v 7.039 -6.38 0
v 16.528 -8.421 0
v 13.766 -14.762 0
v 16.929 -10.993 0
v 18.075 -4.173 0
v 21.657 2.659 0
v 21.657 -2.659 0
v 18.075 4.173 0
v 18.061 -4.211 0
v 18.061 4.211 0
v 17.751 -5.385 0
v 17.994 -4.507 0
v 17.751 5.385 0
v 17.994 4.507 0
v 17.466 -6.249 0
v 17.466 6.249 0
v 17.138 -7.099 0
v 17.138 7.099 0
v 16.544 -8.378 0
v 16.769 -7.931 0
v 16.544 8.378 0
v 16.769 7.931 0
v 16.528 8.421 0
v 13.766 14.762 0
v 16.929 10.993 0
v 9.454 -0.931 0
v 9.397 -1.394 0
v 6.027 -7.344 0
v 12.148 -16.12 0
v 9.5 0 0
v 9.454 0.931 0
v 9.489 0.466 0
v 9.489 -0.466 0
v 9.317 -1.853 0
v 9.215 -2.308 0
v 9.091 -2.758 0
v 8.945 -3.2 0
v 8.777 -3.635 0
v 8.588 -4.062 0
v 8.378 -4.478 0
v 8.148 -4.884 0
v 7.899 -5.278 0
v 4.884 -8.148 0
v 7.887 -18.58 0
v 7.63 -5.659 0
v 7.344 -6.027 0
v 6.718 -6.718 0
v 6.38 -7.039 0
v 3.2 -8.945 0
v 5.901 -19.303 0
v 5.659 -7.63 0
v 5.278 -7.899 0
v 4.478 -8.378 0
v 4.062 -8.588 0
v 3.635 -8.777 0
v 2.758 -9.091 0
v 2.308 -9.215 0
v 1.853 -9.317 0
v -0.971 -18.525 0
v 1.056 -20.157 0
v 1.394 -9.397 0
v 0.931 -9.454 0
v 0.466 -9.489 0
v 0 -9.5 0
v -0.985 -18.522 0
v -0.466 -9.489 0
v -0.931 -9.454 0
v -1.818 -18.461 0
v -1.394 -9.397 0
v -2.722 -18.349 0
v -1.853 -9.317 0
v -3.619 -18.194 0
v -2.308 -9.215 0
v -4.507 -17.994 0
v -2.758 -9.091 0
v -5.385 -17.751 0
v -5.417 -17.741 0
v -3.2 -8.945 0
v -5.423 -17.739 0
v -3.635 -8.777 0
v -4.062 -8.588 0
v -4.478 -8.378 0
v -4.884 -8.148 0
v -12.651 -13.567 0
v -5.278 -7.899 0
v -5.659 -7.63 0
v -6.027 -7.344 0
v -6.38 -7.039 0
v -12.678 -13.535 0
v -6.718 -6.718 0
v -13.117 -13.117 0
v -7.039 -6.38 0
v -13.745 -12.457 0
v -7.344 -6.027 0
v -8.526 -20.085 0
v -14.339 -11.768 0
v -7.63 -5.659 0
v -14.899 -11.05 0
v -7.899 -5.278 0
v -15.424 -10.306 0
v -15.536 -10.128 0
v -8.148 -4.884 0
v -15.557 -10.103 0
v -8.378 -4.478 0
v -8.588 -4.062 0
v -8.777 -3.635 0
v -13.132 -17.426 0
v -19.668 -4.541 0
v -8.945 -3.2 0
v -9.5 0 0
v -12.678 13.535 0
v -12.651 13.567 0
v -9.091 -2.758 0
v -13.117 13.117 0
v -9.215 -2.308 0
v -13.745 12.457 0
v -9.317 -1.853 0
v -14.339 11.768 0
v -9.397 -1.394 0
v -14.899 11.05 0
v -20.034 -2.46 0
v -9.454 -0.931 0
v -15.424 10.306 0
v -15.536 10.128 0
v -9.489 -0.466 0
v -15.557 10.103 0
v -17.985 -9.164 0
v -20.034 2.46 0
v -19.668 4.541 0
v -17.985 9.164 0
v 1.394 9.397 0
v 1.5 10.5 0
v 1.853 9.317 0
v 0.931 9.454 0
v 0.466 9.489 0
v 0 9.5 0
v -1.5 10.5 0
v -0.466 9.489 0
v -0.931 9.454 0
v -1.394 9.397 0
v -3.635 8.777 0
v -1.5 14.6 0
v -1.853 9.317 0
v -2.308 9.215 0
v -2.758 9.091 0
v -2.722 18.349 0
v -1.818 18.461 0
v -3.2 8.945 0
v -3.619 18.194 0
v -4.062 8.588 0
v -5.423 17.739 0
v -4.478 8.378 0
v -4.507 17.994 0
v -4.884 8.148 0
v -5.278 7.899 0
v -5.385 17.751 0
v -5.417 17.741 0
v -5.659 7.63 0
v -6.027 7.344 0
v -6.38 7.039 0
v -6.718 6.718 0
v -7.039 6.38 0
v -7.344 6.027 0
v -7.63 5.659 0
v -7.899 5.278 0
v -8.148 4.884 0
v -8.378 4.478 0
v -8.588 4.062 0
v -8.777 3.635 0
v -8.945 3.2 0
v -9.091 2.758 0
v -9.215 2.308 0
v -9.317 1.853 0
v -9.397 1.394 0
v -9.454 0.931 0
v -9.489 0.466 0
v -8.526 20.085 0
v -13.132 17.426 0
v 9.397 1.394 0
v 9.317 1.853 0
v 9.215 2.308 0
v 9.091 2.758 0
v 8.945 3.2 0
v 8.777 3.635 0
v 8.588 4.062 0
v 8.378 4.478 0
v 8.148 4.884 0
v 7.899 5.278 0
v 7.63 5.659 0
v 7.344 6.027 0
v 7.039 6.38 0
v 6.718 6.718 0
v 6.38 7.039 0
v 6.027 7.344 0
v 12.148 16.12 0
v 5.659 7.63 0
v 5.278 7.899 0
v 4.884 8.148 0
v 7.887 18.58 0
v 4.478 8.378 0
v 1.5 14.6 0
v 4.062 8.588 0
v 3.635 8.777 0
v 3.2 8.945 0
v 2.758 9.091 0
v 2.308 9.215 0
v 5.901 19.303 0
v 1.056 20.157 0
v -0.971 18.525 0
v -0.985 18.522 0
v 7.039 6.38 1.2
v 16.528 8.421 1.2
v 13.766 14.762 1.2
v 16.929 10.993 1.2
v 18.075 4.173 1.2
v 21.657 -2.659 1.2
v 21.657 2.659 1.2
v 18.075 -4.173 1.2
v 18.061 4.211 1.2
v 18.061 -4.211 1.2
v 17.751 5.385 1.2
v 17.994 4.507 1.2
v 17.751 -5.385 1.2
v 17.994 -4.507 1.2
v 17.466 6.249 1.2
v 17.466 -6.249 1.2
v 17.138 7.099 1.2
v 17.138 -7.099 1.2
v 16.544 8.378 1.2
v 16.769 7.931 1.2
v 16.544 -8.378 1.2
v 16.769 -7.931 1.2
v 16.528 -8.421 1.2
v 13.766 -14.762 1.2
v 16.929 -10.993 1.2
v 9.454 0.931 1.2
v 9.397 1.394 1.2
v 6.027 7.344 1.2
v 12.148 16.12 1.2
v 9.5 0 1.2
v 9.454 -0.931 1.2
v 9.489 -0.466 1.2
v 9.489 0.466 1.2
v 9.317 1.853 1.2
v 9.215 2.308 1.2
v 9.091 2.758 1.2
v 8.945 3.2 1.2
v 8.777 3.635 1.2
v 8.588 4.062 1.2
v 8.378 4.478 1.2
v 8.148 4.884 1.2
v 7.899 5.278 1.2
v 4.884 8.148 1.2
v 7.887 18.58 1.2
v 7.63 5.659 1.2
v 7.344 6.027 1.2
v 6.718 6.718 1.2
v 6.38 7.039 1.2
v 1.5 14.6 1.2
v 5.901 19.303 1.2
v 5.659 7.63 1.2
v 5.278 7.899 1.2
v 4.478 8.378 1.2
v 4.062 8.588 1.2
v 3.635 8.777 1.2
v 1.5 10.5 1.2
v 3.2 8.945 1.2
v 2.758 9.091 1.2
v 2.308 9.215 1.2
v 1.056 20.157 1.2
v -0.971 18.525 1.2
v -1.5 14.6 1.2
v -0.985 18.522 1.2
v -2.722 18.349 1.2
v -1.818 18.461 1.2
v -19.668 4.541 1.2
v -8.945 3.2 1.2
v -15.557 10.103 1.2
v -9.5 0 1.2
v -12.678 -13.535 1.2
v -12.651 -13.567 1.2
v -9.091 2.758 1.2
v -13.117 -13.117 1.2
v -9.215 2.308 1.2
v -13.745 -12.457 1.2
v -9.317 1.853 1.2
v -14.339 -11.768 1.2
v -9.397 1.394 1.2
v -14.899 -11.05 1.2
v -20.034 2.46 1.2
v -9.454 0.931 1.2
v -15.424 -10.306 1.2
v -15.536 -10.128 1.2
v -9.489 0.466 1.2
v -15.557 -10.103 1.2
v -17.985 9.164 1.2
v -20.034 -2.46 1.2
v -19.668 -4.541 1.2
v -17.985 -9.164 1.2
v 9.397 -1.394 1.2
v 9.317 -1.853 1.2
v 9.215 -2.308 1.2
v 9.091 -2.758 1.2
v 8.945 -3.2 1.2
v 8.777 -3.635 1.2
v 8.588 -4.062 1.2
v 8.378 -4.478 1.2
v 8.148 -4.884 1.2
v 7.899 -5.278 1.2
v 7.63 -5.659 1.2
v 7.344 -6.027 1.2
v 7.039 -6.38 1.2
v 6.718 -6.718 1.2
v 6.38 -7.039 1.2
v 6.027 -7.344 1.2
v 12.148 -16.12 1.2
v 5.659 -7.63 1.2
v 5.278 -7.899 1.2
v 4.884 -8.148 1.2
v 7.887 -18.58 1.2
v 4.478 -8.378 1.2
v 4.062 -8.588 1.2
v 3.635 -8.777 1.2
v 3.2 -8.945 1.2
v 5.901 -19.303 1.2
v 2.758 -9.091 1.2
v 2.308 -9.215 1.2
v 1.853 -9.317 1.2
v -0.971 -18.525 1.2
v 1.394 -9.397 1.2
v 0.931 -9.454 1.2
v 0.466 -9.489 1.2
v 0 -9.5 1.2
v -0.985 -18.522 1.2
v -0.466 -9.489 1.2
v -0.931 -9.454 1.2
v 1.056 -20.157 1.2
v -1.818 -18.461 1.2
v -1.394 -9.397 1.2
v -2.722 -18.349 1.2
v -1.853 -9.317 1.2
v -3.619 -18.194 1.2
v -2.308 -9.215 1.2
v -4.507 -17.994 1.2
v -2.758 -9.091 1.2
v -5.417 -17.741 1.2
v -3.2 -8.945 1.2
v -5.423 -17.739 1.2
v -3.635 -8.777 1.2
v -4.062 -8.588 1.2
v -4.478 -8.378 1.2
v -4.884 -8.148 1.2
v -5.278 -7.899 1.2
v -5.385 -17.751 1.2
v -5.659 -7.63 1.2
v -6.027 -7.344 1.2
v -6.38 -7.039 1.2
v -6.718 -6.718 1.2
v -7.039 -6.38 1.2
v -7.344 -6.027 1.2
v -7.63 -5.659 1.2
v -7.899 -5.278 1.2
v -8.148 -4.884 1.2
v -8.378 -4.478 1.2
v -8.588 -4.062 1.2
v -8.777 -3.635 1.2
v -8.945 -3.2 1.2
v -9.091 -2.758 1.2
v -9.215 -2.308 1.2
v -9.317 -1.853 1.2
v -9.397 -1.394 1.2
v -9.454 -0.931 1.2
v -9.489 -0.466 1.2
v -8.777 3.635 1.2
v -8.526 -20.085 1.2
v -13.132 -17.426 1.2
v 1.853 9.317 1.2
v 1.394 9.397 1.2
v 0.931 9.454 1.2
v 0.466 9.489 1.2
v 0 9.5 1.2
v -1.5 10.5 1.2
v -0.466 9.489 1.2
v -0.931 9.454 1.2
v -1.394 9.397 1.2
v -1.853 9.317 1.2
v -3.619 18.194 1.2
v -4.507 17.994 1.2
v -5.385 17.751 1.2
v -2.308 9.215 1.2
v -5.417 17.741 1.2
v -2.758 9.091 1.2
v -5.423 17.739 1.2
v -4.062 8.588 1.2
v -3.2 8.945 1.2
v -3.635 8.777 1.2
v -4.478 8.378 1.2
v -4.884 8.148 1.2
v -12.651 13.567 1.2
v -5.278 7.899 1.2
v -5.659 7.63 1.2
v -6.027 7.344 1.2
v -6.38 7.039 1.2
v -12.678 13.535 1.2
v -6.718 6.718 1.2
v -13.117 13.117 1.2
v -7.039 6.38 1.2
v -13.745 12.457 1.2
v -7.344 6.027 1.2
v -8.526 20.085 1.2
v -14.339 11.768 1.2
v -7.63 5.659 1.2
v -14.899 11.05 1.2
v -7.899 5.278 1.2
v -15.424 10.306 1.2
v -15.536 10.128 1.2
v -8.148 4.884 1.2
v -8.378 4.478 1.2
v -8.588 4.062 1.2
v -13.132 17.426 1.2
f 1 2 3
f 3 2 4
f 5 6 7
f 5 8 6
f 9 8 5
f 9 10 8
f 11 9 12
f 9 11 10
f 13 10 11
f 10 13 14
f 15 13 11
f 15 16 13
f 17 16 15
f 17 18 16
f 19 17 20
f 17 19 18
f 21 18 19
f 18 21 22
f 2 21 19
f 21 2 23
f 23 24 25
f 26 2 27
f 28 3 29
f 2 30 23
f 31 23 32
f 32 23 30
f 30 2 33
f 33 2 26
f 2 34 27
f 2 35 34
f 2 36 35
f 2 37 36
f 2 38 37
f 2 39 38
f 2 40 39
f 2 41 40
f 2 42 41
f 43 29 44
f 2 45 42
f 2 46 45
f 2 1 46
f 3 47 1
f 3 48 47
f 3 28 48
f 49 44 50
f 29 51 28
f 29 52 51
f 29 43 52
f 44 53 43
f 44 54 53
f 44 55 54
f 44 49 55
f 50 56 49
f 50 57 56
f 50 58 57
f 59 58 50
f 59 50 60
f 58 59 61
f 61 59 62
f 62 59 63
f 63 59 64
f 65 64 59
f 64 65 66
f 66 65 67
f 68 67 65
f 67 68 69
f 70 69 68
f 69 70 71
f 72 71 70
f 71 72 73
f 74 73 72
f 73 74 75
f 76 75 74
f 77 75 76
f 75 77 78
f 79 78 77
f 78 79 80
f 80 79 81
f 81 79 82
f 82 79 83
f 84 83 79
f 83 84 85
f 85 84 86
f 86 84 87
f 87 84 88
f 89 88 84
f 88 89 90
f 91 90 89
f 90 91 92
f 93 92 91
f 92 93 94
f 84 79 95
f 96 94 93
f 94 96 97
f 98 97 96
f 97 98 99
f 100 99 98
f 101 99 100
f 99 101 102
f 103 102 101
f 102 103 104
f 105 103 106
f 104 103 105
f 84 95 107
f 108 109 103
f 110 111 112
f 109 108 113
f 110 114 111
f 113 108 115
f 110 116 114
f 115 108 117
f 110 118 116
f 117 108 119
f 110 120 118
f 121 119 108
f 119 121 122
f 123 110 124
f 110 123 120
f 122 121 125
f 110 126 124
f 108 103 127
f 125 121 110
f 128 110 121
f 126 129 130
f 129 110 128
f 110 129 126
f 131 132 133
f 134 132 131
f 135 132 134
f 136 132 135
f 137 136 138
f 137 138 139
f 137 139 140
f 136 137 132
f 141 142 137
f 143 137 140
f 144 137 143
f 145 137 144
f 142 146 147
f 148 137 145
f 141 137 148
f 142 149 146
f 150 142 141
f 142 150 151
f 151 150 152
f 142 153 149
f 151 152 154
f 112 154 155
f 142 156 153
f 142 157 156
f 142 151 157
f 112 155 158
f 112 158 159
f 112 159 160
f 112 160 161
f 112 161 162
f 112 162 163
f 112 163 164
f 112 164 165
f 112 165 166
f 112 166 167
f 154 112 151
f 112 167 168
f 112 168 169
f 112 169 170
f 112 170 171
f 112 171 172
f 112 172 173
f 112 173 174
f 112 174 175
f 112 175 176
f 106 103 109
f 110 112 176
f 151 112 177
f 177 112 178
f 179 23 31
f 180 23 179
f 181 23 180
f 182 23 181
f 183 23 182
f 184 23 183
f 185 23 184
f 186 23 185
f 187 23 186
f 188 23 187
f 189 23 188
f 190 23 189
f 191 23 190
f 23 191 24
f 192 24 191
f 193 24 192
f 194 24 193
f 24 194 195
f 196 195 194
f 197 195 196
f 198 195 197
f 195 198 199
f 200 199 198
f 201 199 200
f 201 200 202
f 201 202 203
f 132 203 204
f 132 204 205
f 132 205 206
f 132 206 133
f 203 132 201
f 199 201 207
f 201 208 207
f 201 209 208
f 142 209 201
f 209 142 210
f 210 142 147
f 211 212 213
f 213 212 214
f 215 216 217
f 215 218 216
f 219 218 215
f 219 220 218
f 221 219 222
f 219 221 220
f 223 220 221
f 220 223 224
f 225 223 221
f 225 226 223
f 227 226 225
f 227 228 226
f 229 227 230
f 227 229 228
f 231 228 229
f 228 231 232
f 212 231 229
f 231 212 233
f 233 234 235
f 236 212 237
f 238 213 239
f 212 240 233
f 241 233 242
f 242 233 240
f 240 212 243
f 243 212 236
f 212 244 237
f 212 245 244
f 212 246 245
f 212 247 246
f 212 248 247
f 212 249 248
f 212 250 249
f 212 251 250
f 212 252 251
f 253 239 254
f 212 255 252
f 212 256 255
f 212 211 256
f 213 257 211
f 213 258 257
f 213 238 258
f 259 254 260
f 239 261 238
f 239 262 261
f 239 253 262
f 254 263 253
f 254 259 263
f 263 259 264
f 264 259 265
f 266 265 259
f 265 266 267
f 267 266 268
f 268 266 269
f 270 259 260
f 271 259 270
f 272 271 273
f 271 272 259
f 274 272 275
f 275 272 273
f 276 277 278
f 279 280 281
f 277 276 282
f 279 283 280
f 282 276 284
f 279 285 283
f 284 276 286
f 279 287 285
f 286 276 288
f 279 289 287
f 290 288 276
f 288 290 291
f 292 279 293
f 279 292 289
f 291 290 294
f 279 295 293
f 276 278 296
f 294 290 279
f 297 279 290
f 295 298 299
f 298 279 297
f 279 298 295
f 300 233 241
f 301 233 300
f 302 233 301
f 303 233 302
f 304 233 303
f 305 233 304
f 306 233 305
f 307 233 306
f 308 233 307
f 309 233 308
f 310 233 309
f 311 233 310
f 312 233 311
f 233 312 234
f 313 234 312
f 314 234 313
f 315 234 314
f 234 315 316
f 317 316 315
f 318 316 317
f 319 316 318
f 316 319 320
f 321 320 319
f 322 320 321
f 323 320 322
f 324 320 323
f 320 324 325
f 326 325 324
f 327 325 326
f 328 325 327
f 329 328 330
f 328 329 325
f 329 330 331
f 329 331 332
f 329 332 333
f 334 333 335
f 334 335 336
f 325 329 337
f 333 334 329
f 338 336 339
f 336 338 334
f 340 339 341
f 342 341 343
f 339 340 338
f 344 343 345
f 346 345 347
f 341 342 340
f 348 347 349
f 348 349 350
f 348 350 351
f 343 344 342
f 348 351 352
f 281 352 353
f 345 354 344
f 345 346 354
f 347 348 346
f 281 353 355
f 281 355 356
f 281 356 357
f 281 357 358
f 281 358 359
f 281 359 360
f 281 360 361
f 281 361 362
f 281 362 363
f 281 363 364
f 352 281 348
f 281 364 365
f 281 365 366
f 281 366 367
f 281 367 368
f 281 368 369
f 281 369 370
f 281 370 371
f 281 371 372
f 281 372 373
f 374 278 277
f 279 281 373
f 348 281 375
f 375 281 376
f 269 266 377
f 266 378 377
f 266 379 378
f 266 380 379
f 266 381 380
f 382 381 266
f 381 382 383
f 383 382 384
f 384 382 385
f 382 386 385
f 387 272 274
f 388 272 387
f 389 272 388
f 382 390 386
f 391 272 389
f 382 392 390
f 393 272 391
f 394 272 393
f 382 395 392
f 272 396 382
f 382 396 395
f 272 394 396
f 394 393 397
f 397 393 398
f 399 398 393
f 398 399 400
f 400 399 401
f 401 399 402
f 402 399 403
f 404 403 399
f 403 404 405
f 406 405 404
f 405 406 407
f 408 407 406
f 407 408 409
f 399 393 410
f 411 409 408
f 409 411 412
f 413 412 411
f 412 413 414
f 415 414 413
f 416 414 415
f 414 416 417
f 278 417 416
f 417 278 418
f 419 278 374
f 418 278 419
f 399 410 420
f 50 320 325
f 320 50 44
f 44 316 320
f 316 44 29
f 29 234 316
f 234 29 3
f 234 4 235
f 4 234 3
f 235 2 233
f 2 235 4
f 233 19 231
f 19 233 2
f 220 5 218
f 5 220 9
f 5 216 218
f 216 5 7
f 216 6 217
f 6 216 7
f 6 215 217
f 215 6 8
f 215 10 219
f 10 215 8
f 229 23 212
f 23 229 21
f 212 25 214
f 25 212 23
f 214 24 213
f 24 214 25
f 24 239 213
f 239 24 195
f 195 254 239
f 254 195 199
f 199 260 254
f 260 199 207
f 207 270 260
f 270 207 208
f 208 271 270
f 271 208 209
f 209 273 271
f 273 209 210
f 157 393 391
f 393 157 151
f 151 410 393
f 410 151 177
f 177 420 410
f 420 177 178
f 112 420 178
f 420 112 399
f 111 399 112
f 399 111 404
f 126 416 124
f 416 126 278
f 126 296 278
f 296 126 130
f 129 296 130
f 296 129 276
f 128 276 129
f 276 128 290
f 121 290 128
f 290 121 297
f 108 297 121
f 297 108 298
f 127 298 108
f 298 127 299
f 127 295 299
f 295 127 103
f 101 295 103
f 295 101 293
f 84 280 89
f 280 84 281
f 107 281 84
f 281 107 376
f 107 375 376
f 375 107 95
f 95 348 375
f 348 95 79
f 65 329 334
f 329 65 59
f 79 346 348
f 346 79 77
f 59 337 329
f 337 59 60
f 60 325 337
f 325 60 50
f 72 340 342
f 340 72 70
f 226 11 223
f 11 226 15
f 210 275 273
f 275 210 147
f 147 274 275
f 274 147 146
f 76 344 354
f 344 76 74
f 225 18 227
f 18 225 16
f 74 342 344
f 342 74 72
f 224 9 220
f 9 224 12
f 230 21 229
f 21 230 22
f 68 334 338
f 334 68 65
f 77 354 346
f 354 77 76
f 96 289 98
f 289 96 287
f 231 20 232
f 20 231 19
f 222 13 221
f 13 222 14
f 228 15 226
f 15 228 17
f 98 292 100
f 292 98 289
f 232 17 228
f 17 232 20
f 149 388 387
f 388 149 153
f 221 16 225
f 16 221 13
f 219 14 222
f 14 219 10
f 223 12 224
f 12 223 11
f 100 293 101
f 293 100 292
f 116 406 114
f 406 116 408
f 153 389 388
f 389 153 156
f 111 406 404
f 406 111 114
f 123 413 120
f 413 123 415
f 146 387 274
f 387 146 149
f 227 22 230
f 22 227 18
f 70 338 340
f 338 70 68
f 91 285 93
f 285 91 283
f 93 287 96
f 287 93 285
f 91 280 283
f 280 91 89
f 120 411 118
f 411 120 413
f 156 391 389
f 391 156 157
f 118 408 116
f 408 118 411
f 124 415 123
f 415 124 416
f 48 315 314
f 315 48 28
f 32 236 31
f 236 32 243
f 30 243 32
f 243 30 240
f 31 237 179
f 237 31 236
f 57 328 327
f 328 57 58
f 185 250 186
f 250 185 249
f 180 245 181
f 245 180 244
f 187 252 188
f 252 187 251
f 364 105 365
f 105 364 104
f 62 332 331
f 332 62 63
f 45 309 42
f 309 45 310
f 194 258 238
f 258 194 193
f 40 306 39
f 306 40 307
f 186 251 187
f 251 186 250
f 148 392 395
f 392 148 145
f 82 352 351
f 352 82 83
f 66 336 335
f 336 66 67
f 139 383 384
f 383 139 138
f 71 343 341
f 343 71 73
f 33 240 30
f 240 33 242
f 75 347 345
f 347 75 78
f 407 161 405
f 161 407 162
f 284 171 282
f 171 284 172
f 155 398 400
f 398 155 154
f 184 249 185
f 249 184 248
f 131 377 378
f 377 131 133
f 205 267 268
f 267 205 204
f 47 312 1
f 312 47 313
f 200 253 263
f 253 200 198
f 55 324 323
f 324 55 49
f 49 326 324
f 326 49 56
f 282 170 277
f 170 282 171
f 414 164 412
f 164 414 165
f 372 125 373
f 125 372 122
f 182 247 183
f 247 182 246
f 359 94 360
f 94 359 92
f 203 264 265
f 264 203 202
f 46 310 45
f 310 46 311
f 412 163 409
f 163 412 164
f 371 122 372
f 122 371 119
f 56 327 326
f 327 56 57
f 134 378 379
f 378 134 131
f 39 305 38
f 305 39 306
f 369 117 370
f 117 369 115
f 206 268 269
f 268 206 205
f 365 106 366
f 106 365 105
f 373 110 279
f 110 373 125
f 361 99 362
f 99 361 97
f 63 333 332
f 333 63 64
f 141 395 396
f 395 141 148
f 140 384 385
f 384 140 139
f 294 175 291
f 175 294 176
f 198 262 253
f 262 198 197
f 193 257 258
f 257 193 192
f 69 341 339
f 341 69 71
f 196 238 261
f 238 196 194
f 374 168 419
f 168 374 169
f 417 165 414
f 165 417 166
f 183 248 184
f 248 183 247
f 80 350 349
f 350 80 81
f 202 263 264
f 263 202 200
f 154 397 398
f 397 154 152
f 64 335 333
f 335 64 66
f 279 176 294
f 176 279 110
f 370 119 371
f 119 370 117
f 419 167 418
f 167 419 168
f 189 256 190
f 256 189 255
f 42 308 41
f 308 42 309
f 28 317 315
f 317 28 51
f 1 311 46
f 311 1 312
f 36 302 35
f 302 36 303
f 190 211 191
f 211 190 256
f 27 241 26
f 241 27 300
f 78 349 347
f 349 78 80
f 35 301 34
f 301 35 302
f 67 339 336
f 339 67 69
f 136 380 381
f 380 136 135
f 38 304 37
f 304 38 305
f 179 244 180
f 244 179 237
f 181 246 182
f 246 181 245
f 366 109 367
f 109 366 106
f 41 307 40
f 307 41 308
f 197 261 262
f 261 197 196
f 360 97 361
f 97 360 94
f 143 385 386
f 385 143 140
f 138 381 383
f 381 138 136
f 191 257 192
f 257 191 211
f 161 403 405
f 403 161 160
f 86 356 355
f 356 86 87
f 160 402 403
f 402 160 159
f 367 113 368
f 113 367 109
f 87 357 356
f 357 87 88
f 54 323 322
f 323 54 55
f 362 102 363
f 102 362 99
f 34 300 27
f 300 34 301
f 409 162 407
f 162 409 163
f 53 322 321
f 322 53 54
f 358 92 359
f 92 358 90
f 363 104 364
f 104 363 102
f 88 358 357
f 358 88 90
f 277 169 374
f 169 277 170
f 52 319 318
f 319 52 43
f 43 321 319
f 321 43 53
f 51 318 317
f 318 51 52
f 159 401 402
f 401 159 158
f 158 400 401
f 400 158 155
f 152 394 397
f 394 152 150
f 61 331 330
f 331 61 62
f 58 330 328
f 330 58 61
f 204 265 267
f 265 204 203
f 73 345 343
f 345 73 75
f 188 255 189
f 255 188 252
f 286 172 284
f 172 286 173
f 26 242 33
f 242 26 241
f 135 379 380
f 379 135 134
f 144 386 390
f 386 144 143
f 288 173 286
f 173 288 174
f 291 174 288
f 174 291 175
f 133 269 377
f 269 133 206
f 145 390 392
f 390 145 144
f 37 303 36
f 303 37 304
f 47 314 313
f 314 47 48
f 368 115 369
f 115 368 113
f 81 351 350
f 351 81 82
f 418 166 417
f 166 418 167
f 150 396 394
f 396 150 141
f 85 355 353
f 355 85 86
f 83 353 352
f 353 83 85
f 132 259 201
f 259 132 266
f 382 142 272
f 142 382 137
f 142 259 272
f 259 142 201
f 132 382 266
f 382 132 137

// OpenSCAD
/*
  Elna Supermatic cam 10
  Name: Blind hem
  Status: candidate

  Generated from measured parametric base v2.
  Surface mode: stepped
*/

include <_elna_measured_common.scad>;

profile_points = [
        [1.0564, 20.1573],
        [5.9015, 19.3030],
        [7.8869, 18.5804],
        [12.1476, 16.1205],
        [13.7661, 14.7624],
        [16.9286, 10.9935],
        [16.5282, 8.4215],
        [18.0746, 4.1728],
        [21.6574, 2.6592],
        [21.6574, -2.6592],
        [18.0746, -4.1728],
        [16.5282, -8.4215],
        [16.9286, -10.9935],
        [13.7661, -14.7624],
        [12.1476, -16.1205],
        [7.8869, -18.5804],
        [5.9015, -19.3030],
        [1.0564, -20.1573],
        [-0.9708, -18.5246],
        [-5.4235, -17.7395],
        [-8.5258, -20.0854],
        [-13.1316, -17.4262],
        [-12.6511, -13.5666],
        [-15.5573, -10.1031],
        [-17.9850, -9.1638],
        [-19.6677, -4.5406],
        [-20.0345, -2.4599],
        [-20.0345, 2.4599],
        [-19.6677, 4.5406],
        [-17.9850, 9.1638],
        [-15.5573, 10.1031],
        [-12.6511, 13.5666],
        [-13.1316, 17.4262],
        [-8.5258, 20.0854],
        [-5.4235, 17.7395],
        [-0.9708, 18.5246]
];

icon_points = [[-1.000,0.180], [-0.820,0.180], [-0.640,0.180], [-0.460,0.180], [-0.300,0.720], [-0.140,0.180], [0.020,0.180], [0.200,0.180], [0.380,0.180], [0.540,0.720], [0.700,0.180], [1.000,0.180]];

elna_cam_ring(profile_points=profile_points);
